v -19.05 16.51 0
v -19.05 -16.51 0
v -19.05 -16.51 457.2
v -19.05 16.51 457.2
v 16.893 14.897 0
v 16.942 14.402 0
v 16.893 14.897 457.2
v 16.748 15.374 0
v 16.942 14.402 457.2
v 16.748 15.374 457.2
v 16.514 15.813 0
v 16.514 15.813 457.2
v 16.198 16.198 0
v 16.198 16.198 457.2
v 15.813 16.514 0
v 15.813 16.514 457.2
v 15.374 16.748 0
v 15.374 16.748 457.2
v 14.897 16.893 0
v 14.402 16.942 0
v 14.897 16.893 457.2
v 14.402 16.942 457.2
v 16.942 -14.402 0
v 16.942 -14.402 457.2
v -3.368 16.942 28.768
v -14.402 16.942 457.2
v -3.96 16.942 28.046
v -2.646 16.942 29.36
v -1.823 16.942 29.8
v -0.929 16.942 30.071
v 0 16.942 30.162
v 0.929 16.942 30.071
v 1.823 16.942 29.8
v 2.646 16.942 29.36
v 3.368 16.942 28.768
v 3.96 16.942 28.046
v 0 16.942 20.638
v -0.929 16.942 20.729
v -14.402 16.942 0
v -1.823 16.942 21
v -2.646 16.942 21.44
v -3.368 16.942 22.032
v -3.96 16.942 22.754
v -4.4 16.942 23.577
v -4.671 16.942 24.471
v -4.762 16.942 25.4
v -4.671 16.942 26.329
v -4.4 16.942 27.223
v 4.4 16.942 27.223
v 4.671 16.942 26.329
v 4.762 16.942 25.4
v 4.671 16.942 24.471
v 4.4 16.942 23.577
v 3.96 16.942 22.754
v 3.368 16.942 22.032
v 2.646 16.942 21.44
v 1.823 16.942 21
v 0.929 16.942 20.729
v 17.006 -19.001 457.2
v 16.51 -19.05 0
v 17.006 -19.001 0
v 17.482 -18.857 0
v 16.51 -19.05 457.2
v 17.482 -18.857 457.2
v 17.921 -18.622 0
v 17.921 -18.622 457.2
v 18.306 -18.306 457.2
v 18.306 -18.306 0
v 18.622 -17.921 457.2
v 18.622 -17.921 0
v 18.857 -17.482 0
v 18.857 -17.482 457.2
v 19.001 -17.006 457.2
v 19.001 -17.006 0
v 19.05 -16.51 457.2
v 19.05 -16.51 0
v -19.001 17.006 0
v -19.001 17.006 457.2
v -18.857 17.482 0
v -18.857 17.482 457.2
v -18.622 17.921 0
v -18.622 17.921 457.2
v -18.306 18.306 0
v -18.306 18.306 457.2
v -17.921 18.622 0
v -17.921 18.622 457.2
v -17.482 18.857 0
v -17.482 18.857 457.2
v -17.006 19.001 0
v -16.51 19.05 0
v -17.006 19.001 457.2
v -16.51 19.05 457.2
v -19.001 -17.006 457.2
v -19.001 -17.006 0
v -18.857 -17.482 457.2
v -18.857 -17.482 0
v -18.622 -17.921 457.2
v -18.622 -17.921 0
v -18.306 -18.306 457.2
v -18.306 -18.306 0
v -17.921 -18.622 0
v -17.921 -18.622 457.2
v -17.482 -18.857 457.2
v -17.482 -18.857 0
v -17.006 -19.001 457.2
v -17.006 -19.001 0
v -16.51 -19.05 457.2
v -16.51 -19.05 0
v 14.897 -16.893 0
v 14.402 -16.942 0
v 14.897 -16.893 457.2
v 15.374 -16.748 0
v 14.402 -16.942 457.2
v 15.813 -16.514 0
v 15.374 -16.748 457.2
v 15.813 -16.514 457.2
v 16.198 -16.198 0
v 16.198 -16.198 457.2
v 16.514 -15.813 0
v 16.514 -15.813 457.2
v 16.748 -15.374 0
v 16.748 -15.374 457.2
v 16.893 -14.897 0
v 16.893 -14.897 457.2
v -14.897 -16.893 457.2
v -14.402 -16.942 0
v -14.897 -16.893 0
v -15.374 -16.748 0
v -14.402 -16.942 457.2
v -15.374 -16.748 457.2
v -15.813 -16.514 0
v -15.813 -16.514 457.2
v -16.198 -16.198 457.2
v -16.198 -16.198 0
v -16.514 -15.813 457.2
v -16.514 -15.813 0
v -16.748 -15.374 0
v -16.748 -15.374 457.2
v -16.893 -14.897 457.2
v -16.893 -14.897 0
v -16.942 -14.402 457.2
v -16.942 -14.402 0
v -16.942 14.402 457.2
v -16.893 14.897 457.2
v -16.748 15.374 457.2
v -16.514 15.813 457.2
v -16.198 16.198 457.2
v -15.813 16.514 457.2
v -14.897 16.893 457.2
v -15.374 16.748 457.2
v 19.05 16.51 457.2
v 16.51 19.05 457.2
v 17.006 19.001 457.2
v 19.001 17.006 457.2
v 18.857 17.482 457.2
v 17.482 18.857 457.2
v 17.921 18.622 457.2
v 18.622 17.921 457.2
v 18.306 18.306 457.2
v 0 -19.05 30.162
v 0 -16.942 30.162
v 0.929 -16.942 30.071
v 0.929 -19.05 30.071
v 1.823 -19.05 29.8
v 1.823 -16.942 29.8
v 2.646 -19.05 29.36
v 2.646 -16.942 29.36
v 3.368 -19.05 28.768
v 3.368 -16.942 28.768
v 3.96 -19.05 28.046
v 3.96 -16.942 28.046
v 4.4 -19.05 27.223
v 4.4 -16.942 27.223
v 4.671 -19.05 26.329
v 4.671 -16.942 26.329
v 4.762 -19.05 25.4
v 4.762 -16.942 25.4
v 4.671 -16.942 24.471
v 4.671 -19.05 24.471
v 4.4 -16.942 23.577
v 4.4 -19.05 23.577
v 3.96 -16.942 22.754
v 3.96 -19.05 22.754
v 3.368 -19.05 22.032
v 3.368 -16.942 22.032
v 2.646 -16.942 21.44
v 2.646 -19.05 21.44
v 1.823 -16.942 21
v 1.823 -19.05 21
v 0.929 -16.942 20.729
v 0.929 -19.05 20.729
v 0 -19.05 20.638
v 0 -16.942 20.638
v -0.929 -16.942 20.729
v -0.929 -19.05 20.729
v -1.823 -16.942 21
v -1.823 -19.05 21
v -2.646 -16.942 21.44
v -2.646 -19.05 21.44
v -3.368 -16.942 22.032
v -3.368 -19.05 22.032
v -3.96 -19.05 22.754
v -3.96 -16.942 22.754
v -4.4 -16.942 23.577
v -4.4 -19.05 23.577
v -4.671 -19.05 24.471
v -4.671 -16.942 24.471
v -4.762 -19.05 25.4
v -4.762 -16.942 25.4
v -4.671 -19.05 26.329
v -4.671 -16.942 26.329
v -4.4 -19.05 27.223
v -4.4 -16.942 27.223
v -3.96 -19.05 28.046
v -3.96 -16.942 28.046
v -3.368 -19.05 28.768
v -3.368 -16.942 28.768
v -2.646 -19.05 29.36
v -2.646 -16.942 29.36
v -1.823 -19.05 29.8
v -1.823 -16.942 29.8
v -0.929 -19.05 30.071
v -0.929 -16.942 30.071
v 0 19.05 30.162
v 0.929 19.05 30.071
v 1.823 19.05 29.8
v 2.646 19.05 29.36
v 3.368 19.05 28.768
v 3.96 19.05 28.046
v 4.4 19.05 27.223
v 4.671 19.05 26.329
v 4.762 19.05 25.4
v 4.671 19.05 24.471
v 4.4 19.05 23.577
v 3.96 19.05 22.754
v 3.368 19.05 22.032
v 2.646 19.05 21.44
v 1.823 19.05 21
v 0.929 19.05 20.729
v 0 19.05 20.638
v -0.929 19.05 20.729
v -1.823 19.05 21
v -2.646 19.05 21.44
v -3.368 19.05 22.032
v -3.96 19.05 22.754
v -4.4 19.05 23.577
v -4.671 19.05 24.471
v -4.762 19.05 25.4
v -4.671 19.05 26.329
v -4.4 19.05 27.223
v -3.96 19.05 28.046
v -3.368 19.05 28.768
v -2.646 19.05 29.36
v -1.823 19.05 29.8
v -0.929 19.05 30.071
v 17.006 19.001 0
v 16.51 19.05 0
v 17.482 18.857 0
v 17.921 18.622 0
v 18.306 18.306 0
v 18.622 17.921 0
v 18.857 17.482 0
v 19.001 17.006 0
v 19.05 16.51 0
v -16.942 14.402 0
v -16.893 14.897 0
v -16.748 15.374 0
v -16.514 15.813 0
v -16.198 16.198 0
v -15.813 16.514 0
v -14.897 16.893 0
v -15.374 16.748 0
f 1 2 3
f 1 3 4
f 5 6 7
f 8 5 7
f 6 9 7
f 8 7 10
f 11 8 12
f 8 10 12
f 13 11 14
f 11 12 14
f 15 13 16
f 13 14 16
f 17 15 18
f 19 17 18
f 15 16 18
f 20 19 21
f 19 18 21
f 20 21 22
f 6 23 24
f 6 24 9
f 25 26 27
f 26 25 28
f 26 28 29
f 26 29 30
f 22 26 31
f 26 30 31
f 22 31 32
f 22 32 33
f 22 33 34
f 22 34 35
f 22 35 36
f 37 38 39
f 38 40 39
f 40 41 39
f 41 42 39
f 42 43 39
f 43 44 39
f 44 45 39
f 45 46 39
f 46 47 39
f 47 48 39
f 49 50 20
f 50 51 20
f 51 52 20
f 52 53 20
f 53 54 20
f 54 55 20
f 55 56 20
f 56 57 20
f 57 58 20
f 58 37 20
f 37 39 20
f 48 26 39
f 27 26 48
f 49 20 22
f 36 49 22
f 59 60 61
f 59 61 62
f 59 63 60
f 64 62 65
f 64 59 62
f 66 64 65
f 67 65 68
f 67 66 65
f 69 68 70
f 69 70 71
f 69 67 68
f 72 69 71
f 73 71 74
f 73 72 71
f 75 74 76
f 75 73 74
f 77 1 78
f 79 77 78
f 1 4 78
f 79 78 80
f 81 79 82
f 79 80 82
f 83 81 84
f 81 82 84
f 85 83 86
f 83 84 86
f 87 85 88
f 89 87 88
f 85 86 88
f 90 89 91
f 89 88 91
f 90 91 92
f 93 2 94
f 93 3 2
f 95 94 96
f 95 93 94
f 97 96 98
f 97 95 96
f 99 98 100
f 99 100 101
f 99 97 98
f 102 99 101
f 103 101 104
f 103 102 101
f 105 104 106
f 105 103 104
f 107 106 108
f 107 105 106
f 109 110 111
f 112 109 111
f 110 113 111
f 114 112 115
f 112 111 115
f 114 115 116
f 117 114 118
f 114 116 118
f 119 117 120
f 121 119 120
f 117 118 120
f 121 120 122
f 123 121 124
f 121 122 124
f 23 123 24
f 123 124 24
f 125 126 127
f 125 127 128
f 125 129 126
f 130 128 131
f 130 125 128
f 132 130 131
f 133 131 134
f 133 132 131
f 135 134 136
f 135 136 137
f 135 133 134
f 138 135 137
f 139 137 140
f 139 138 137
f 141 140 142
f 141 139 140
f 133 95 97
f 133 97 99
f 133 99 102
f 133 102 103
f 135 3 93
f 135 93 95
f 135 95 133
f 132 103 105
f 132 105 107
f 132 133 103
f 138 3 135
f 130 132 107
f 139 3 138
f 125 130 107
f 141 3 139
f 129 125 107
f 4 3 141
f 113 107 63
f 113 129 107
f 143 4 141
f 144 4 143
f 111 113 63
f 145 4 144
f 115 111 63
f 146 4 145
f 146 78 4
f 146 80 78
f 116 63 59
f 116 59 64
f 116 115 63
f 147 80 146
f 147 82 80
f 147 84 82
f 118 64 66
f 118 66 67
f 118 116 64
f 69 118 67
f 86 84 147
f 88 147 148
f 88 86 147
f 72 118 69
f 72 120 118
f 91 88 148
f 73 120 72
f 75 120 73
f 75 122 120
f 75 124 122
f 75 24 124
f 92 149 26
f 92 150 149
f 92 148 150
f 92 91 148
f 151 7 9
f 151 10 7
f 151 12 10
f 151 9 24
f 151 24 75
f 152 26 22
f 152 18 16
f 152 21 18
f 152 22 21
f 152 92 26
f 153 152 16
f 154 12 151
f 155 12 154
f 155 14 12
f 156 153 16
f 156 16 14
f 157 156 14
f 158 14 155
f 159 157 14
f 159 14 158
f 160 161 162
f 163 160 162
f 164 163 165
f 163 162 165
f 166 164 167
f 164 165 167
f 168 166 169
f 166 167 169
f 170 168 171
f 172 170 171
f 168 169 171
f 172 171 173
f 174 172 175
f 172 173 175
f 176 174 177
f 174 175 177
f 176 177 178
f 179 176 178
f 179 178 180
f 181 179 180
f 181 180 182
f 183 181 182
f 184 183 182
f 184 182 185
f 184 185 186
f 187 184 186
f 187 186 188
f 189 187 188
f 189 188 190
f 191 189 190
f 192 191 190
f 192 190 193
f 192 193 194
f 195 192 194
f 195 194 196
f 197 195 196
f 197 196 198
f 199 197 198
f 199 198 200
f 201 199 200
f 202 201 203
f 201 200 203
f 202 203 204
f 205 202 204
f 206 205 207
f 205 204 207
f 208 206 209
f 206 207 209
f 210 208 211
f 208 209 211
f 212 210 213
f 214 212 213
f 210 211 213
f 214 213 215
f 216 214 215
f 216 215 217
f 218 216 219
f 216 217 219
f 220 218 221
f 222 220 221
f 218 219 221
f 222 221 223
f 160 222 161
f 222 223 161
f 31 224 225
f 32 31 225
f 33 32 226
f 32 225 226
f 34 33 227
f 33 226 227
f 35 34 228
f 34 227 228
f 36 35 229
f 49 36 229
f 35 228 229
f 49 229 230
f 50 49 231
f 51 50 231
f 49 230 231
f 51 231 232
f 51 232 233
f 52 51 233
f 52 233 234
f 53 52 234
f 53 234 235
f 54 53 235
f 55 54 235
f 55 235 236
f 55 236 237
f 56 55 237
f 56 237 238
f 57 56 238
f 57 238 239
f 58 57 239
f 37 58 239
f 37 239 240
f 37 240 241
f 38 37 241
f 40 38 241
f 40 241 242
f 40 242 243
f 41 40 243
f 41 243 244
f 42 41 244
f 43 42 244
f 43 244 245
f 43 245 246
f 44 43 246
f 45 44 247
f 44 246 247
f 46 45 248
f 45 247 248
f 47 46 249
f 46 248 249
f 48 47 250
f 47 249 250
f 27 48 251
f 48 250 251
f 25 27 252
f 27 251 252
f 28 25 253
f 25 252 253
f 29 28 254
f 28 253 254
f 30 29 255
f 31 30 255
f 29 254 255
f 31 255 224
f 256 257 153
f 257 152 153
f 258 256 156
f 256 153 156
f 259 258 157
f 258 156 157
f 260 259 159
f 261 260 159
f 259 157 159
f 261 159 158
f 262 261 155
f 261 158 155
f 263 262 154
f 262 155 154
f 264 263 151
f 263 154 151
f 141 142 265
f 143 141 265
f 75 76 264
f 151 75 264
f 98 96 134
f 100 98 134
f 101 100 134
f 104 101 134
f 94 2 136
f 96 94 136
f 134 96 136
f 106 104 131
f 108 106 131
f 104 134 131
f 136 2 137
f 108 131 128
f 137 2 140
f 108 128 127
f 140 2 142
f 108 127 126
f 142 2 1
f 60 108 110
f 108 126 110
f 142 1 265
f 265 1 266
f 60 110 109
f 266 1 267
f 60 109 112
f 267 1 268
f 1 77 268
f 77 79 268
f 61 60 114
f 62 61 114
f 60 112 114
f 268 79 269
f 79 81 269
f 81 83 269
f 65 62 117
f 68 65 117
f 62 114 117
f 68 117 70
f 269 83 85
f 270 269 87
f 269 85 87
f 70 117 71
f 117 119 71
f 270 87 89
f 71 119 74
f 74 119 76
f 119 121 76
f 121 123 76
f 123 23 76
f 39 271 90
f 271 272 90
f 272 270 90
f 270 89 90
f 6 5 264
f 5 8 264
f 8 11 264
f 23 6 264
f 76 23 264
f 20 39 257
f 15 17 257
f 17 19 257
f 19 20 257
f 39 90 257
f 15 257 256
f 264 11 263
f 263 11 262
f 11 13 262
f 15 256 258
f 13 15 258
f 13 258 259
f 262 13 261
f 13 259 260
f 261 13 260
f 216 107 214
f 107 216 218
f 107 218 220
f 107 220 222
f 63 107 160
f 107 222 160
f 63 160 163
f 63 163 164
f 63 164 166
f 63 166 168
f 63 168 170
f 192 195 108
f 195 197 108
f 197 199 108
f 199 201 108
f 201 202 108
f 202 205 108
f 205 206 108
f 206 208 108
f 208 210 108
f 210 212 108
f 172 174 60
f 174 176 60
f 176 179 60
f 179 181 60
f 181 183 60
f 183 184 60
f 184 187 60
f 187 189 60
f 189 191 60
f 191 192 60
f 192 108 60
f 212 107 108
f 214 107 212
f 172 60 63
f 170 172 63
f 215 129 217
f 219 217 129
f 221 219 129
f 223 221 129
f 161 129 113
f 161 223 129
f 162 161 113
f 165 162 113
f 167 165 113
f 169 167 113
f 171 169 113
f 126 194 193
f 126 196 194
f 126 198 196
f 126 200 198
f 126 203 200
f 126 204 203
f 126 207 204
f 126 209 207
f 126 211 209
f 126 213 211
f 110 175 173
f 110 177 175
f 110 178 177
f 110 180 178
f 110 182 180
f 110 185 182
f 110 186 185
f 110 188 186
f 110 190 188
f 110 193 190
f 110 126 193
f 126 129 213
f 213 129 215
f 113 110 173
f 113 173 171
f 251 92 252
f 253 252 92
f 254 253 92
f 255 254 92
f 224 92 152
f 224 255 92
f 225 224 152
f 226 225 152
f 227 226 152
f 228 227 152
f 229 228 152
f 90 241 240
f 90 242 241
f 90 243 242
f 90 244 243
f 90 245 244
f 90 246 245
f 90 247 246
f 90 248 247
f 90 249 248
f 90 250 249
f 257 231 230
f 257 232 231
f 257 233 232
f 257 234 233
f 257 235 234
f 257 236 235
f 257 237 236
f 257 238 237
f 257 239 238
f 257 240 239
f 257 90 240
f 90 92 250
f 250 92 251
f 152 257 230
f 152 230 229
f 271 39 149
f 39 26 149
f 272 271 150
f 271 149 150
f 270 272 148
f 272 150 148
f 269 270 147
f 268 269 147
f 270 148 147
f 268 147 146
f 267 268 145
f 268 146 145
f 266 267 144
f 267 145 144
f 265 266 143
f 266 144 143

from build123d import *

# Parameters (mm, degrees)
SKETCH1_W           = 38.1
SKETCH1_H           = 38.1
SKETCH1_W_2         = 33.8836
SKETCH1_H_2         = 33.8836
BOSS_EXTRUDE1_DEPTH = 457.2
FILLET1_R           = 2.54
SKETCH2_R           = 4.7625
CUT_EXTRUDE1_DEPTH  = 460.180087221


with BuildPart() as part:
    # Sketch1 → Boss-Extrude1 (new body)
    with BuildSketch(Plane.XY):
        Rectangle(SKETCH1_W, SKETCH1_H)
        Rectangle(SKETCH1_W_2, SKETCH1_H_2, mode=Mode.SUBTRACT)
    extrude(amount=BOSS_EXTRUDE1_DEPTH)

    # Fillet1
    fillet1_edges = [part.edges().sort_by_distance(p)[0] for p in [
        (19.05, -19.05, 228.6),
        (16.9418, -16.9418, 228.6),
        (16.9418, 16.9418, 228.6),
        (19.05, 19.05, 228.6),
        (-16.9418, 16.9418, 228.6),
        (-19.05, 19.05, 228.6),
        (-16.9418, -16.9418, 228.6),
        (-19.05, -19.05, 228.6),
    ]]
    fillet(fillet1_edges, radius=FILLET1_R)

    # Sketch2 → Cut-Extrude1 (cut, through all)
    with BuildSketch(Plane(origin=(0, 19.05, 0), x_dir=(1, 0, 0), z_dir=(0, 1, 0))):
        with Locations((0, -25.4)):
            Circle(SKETCH2_R)
    extrude(amount=-CUT_EXTRUDE1_DEPTH, mode=Mode.SUBTRACT)


solid = part.part
